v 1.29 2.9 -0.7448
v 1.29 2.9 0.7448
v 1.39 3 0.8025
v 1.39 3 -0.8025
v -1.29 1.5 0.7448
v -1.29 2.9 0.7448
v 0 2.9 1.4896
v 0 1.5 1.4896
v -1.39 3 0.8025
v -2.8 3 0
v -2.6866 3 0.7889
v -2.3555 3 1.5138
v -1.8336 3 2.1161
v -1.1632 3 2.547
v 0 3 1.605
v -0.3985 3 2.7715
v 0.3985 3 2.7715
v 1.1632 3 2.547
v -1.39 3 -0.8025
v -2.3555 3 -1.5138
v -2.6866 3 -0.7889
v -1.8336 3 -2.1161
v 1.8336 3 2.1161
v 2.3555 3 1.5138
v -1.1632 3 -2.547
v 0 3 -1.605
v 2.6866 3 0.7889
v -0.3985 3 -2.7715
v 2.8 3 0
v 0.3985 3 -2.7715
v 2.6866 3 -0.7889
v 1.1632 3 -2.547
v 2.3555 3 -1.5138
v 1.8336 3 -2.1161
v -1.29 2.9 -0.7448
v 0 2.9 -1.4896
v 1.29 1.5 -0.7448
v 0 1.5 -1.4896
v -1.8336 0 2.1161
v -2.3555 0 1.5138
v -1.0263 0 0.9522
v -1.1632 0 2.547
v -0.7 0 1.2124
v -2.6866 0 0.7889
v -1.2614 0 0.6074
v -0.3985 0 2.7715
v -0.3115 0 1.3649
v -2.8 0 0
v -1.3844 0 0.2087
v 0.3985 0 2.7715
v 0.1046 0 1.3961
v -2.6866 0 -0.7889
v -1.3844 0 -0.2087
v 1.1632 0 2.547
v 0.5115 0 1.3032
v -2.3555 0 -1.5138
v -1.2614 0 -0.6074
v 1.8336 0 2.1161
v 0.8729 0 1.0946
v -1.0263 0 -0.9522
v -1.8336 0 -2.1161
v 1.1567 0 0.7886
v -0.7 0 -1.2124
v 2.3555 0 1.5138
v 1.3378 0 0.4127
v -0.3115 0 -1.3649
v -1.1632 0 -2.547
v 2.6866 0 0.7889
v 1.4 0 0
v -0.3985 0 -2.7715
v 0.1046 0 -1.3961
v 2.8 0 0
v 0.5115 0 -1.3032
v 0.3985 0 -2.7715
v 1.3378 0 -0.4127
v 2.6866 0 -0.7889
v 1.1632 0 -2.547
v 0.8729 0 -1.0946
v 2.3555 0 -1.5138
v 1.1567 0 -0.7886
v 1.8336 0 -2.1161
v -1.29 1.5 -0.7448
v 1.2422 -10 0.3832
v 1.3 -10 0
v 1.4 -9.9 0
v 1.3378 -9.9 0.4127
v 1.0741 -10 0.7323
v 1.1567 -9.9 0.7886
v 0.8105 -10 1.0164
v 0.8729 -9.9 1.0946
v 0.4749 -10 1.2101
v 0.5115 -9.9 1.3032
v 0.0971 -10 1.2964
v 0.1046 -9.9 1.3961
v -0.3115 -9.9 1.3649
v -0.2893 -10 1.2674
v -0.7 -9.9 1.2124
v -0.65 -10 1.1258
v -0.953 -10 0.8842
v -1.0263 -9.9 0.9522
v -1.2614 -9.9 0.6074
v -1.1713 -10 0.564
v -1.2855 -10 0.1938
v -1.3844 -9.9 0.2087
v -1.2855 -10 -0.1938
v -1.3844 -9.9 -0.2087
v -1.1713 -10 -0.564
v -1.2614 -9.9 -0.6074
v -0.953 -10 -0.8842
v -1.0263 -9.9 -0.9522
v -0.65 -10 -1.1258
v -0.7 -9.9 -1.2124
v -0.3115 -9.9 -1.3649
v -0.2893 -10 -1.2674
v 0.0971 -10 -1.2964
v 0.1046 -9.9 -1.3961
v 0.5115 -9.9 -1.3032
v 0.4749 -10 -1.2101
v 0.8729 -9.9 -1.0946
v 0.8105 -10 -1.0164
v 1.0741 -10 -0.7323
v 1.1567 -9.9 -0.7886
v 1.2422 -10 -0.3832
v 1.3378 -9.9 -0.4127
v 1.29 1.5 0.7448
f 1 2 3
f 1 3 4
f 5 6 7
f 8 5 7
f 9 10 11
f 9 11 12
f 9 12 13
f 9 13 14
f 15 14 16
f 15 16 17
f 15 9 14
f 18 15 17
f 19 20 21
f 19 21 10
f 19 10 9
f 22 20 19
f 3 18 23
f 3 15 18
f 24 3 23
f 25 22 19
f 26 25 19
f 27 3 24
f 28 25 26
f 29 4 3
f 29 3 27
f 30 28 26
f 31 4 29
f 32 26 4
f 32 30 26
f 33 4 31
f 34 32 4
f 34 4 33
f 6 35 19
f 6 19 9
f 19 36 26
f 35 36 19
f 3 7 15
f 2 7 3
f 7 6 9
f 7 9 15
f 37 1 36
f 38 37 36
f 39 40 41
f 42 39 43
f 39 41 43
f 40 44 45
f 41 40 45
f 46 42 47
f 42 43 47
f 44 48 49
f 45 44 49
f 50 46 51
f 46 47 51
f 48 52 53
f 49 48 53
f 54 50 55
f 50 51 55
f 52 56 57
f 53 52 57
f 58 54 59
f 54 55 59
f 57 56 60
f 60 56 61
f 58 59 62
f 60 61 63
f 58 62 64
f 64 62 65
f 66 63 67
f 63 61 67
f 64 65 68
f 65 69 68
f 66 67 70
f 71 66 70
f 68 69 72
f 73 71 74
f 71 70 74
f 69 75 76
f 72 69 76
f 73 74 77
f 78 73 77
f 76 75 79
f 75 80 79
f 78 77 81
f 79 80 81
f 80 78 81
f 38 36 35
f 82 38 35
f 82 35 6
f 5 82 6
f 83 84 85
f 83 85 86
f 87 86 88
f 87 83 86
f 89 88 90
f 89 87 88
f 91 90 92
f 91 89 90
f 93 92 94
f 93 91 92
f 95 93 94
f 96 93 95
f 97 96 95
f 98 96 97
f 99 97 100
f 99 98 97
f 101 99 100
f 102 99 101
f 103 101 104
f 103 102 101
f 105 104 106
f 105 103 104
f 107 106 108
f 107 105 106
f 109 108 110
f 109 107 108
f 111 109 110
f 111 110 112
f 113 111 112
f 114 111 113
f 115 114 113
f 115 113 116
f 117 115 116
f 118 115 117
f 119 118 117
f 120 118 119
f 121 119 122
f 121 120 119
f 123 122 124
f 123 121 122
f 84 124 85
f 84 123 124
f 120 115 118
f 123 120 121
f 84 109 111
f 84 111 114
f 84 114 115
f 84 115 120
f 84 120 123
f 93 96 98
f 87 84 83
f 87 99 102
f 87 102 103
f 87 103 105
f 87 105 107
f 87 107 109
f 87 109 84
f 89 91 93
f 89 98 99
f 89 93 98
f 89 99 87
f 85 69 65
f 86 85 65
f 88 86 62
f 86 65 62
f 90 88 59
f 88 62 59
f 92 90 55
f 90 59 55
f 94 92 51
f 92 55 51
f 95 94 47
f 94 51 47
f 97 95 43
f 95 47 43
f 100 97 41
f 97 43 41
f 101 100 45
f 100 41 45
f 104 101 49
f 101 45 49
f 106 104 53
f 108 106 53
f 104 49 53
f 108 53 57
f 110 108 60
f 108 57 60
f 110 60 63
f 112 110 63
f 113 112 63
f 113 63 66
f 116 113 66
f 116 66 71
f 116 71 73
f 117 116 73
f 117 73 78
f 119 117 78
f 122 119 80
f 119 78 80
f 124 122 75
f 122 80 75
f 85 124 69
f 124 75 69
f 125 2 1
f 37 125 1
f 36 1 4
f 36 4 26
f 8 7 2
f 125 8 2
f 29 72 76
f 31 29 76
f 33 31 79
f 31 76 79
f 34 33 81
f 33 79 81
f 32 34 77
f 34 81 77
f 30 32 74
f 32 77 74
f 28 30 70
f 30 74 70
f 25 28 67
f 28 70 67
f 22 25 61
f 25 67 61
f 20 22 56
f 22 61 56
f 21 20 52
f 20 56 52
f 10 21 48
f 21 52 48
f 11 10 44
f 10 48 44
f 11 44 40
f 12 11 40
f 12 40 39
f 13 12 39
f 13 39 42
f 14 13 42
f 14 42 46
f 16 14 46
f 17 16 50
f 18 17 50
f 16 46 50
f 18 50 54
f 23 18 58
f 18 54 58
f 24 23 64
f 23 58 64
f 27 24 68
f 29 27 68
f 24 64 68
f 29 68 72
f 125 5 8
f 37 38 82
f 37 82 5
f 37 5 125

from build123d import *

# Parameters (mm, degrees)
SKETCH_1_R          = 2.8
EXTRUDE_1_DEPTH     = 3
CUT_EXTRUDE_1_DEPTH = 1.5
SKETCH_3_R          = 1.4
EXTRUDE_2_DEPTH     = 10
CHAMFER_1_SIZE      = 0.1


with BuildPart() as part:
    # 草图1 → 凸台-拉伸1 (new body)
    with BuildSketch(Plane(origin=(0, 0, 0), x_dir=(1, 0, 0), z_dir=(0, 1, 0))):
        Circle(SKETCH_1_R)
    extrude(amount=EXTRUDE_1_DEPTH)

    # 草图2 → 切除-拉伸1 (cut)
    with BuildSketch(Plane(origin=(0, 3, 0), x_dir=(1, 0, 0), z_dir=(0, 1, 0))):
        Polygon((0, -1.489563695), (1.29, -0.744781847), (1.29, 0.744781847), (0, 1.489563695), (-1.29, 0.744781847), (-1.29, -0.744781847), align=None)
    extrude(amount=-CUT_EXTRUDE_1_DEPTH, mode=Mode.SUBTRACT)

    # 草图3 → 凸台-拉伸2 (add)
    with BuildSketch(Plane.XZ):
        Circle(SKETCH_3_R)
    extrude(amount=EXTRUDE_2_DEPTH)

    # 倒角1
    chamfer_1_edges = [part.edges().sort_by_distance(p)[0] for p in [
        (-0.645, 3, 1.117172771),
        (0.645, 3, 1.117172771),
        (1.29, 3, 0),
        (0.645, 3, -1.117172771),
        (-0.645, 3, -1.117172771),
        (-1.29, 3, 0),
        (-1.4, -10, 0),
    ]]
    chamfer(chamfer_1_edges, length=CHAMFER_1_SIZE)


solid = part.part
